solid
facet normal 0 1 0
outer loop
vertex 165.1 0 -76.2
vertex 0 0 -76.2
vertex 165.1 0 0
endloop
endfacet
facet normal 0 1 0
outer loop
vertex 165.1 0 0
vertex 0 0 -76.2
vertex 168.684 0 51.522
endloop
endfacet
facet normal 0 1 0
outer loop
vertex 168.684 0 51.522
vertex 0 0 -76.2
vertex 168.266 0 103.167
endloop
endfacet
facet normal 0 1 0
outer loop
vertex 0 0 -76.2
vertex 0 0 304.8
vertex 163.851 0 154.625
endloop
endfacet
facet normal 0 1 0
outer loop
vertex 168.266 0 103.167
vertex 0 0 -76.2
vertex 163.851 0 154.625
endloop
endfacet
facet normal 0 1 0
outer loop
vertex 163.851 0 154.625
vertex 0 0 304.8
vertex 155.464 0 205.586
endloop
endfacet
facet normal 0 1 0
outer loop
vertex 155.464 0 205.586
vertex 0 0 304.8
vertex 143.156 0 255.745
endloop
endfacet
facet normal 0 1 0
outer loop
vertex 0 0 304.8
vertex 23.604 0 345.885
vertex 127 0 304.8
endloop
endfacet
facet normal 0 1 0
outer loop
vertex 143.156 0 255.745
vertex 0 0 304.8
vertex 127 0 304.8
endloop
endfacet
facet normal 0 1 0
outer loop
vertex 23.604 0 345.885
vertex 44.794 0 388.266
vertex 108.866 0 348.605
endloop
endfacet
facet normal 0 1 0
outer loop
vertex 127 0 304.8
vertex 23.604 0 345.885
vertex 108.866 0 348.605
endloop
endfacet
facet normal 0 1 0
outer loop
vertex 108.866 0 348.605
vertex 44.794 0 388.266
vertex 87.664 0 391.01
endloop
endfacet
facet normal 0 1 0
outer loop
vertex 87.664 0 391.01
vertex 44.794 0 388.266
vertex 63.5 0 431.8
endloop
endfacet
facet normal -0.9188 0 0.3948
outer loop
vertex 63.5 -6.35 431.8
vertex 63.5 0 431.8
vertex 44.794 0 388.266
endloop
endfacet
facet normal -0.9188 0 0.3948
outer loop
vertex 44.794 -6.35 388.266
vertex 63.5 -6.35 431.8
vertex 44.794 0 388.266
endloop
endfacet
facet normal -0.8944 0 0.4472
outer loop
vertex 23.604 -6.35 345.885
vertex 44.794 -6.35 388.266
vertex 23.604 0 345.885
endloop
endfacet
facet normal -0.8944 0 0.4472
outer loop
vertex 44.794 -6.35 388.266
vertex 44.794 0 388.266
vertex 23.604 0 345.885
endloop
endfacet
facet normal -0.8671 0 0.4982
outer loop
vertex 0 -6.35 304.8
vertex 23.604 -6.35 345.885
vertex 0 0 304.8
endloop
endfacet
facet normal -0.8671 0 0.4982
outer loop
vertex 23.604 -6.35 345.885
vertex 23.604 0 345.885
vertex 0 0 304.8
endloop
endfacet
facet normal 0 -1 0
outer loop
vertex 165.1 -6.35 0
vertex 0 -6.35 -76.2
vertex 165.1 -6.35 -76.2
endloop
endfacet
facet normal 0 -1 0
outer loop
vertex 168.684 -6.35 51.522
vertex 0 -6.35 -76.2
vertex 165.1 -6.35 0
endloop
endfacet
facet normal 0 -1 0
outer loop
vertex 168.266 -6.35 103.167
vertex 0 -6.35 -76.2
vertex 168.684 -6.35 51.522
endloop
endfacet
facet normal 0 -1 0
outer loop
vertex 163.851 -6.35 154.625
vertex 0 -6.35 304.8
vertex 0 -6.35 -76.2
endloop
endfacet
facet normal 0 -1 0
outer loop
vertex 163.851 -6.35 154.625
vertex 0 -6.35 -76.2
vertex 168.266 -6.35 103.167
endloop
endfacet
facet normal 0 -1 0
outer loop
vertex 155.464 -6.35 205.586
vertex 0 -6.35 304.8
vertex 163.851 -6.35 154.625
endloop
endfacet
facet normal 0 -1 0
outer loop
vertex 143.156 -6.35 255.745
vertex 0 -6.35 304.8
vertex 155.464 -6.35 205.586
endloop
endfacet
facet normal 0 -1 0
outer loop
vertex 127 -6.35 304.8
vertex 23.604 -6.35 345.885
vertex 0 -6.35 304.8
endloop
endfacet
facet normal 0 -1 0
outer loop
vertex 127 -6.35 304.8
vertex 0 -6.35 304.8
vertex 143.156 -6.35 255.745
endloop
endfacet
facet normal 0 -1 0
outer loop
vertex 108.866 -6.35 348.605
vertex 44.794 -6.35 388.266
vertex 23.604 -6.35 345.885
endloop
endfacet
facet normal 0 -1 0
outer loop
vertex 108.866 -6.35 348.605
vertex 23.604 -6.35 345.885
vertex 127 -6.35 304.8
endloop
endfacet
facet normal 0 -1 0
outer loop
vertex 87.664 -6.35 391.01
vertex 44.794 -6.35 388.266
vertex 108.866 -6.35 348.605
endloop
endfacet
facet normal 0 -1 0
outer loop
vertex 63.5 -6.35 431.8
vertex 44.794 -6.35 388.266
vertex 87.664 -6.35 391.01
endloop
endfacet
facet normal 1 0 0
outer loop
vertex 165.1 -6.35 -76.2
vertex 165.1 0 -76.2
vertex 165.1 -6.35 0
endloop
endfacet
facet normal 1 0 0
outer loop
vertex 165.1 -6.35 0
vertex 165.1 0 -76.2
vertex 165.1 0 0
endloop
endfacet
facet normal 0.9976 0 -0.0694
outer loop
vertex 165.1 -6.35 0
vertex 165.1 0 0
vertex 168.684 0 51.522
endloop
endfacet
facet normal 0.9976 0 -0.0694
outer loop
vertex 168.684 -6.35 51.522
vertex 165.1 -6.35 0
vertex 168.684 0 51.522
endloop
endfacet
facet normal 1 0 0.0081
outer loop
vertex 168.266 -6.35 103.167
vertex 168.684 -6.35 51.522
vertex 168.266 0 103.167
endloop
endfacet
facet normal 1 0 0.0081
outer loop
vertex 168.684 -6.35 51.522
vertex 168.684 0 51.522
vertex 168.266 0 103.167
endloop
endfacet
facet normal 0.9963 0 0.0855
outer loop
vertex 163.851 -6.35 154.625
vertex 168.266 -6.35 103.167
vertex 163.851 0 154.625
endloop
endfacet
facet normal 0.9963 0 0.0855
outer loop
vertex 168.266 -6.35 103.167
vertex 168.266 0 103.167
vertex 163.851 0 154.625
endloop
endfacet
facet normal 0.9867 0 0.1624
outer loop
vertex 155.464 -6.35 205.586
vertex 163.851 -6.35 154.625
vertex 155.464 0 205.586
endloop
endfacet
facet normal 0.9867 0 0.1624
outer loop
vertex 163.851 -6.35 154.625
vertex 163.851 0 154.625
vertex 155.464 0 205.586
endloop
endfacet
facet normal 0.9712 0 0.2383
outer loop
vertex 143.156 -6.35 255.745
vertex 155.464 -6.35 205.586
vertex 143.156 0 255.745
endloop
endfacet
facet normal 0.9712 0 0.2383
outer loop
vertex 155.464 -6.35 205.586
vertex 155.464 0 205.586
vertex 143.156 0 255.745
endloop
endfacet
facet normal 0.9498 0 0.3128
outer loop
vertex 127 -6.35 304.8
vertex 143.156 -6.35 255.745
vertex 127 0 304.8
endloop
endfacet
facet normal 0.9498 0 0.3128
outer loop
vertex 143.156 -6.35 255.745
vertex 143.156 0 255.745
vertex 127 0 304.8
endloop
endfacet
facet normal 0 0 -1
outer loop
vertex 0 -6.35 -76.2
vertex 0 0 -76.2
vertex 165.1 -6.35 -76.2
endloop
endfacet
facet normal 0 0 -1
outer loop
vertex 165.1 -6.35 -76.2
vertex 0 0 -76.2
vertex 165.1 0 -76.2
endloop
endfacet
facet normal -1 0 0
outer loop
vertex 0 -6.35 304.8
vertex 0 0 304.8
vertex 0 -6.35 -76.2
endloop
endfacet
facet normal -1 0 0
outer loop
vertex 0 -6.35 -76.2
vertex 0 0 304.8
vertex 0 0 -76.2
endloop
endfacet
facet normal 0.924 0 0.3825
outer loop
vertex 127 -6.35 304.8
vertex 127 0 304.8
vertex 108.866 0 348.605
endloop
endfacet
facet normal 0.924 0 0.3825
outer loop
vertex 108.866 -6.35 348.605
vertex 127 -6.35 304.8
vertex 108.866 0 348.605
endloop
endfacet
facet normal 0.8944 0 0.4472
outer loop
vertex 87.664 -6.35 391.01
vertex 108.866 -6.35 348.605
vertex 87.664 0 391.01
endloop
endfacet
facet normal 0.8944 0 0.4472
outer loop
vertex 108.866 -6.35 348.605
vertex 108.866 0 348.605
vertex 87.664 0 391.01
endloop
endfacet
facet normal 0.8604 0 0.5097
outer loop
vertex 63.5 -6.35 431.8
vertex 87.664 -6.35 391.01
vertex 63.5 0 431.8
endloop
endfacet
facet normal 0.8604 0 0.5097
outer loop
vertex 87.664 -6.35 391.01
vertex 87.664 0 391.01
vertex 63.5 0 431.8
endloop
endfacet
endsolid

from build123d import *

# Parameters (mm, degrees)
F0_W     = 25.4
F0_H     = 203.2
F0_H_2   = 101.6
F0_W_2   = 63.5
F0_W_3   = 38.1
F1_DEPTH = 6.35


with BuildPart() as f1:
    # F0 (on Front) → F1 (new body)
    with BuildSketch(Plane.XZ):
        with Locations((12.7, 101.6)):
            Rectangle(F0_W, F0_H)
        with Locations((12.7, 254)):
            Rectangle(F0_W, F0_H_2)
        with BuildLine():
            ThreePointArc((25.4, 349.25), (13.0471808847, 326.826610923), (0, 304.8))
            Line((0, 304.8), (25.4, 304.8))
            Line((25.4, 304.8), (25.4, 349.25))
        make_face()
        with BuildLine():
            Line((25.4, 349.25), (25.4, 304.8))
            Line((25.4, 304.8), (63.5, 304.8))
            Line((63.5, 304.8), (63.5, 431.8))
            ThreePointArc((63.5, 431.8), (45.5956444739, 389.996241012), (25.4, 349.25))
        make_face()
        with BuildLine():
            Line((63.5, 431.8), (63.5, 304.8))
            Line((63.5, 304.8), (127, 304.8))
            ThreePointArc((127, 304.8), (98.6420785739, 369.996039287), (63.5, 431.8))
        make_face()
        with Locations((95.25, 254)):
            Rectangle(F0_W_2, F0_H_2)
        with Locations((44.45, 254)):
            Rectangle(F0_W_3, F0_H_2)
        Polygon((25.4, 203.2), (25.4, 0), (50.8, 0), (63.5, 0), (63.5, 203.2), align=None)
        with Locations((95.25, 101.6)):
            Rectangle(F0_W_2, F0_H)
        Polygon((152.4, 203.2), (127, 203.2), (127, 0), (130.463650802, 0), (152.4, 0), align=None)
        with BuildLine():
            Line((152.4, 0), (165.1, 0))
            ThreePointArc((165.1, 0), (168.0222390688, 35.93060895), (168.9972698039, 71.9666666667))
            ThreePointArc((168.9972698039, 71.9666666667), (158.4139149447, 190.2619875611), (127, 304.8))
            Line((127, 304.8), (127, 203.2))
            Line((127, 203.2), (152.4, 203.2))
            Line((152.4, 203.2), (152.4, 0))
        make_face()
        with BuildLine():
            Line((25.4, 0), (0, 0))
            Line((0, 0), (0, -76.2))
            Line((0, -76.2), (152.3172585759, -76.2))
            ThreePointArc((152.3172585759, -76.2), (159.8138971323, -38.2854114575), (165.1, 0))
            Line((165.1, 0), (152.4, 0))
            Line((152.4, 0), (130.463650802, 0))
            Line((130.463650802, 0), (127, 0))
            Line((127, 0), (63.5, 0))
            Line((63.5, 0), (50.8, 0))
            Line((50.8, 0), (25.4, 0))
        make_face()
        with BuildLine():
            ThreePointArc((165.1, 0), (159.8138971323, -38.2854114575), (152.3172585759, -76.2))
            Line((152.3172585759, -76.2), (165.1, -76.2))
            Line((165.1, -76.2), (165.1, 0))
        make_face()
    extrude(amount=F1_DEPTH)


solid = f1.part
